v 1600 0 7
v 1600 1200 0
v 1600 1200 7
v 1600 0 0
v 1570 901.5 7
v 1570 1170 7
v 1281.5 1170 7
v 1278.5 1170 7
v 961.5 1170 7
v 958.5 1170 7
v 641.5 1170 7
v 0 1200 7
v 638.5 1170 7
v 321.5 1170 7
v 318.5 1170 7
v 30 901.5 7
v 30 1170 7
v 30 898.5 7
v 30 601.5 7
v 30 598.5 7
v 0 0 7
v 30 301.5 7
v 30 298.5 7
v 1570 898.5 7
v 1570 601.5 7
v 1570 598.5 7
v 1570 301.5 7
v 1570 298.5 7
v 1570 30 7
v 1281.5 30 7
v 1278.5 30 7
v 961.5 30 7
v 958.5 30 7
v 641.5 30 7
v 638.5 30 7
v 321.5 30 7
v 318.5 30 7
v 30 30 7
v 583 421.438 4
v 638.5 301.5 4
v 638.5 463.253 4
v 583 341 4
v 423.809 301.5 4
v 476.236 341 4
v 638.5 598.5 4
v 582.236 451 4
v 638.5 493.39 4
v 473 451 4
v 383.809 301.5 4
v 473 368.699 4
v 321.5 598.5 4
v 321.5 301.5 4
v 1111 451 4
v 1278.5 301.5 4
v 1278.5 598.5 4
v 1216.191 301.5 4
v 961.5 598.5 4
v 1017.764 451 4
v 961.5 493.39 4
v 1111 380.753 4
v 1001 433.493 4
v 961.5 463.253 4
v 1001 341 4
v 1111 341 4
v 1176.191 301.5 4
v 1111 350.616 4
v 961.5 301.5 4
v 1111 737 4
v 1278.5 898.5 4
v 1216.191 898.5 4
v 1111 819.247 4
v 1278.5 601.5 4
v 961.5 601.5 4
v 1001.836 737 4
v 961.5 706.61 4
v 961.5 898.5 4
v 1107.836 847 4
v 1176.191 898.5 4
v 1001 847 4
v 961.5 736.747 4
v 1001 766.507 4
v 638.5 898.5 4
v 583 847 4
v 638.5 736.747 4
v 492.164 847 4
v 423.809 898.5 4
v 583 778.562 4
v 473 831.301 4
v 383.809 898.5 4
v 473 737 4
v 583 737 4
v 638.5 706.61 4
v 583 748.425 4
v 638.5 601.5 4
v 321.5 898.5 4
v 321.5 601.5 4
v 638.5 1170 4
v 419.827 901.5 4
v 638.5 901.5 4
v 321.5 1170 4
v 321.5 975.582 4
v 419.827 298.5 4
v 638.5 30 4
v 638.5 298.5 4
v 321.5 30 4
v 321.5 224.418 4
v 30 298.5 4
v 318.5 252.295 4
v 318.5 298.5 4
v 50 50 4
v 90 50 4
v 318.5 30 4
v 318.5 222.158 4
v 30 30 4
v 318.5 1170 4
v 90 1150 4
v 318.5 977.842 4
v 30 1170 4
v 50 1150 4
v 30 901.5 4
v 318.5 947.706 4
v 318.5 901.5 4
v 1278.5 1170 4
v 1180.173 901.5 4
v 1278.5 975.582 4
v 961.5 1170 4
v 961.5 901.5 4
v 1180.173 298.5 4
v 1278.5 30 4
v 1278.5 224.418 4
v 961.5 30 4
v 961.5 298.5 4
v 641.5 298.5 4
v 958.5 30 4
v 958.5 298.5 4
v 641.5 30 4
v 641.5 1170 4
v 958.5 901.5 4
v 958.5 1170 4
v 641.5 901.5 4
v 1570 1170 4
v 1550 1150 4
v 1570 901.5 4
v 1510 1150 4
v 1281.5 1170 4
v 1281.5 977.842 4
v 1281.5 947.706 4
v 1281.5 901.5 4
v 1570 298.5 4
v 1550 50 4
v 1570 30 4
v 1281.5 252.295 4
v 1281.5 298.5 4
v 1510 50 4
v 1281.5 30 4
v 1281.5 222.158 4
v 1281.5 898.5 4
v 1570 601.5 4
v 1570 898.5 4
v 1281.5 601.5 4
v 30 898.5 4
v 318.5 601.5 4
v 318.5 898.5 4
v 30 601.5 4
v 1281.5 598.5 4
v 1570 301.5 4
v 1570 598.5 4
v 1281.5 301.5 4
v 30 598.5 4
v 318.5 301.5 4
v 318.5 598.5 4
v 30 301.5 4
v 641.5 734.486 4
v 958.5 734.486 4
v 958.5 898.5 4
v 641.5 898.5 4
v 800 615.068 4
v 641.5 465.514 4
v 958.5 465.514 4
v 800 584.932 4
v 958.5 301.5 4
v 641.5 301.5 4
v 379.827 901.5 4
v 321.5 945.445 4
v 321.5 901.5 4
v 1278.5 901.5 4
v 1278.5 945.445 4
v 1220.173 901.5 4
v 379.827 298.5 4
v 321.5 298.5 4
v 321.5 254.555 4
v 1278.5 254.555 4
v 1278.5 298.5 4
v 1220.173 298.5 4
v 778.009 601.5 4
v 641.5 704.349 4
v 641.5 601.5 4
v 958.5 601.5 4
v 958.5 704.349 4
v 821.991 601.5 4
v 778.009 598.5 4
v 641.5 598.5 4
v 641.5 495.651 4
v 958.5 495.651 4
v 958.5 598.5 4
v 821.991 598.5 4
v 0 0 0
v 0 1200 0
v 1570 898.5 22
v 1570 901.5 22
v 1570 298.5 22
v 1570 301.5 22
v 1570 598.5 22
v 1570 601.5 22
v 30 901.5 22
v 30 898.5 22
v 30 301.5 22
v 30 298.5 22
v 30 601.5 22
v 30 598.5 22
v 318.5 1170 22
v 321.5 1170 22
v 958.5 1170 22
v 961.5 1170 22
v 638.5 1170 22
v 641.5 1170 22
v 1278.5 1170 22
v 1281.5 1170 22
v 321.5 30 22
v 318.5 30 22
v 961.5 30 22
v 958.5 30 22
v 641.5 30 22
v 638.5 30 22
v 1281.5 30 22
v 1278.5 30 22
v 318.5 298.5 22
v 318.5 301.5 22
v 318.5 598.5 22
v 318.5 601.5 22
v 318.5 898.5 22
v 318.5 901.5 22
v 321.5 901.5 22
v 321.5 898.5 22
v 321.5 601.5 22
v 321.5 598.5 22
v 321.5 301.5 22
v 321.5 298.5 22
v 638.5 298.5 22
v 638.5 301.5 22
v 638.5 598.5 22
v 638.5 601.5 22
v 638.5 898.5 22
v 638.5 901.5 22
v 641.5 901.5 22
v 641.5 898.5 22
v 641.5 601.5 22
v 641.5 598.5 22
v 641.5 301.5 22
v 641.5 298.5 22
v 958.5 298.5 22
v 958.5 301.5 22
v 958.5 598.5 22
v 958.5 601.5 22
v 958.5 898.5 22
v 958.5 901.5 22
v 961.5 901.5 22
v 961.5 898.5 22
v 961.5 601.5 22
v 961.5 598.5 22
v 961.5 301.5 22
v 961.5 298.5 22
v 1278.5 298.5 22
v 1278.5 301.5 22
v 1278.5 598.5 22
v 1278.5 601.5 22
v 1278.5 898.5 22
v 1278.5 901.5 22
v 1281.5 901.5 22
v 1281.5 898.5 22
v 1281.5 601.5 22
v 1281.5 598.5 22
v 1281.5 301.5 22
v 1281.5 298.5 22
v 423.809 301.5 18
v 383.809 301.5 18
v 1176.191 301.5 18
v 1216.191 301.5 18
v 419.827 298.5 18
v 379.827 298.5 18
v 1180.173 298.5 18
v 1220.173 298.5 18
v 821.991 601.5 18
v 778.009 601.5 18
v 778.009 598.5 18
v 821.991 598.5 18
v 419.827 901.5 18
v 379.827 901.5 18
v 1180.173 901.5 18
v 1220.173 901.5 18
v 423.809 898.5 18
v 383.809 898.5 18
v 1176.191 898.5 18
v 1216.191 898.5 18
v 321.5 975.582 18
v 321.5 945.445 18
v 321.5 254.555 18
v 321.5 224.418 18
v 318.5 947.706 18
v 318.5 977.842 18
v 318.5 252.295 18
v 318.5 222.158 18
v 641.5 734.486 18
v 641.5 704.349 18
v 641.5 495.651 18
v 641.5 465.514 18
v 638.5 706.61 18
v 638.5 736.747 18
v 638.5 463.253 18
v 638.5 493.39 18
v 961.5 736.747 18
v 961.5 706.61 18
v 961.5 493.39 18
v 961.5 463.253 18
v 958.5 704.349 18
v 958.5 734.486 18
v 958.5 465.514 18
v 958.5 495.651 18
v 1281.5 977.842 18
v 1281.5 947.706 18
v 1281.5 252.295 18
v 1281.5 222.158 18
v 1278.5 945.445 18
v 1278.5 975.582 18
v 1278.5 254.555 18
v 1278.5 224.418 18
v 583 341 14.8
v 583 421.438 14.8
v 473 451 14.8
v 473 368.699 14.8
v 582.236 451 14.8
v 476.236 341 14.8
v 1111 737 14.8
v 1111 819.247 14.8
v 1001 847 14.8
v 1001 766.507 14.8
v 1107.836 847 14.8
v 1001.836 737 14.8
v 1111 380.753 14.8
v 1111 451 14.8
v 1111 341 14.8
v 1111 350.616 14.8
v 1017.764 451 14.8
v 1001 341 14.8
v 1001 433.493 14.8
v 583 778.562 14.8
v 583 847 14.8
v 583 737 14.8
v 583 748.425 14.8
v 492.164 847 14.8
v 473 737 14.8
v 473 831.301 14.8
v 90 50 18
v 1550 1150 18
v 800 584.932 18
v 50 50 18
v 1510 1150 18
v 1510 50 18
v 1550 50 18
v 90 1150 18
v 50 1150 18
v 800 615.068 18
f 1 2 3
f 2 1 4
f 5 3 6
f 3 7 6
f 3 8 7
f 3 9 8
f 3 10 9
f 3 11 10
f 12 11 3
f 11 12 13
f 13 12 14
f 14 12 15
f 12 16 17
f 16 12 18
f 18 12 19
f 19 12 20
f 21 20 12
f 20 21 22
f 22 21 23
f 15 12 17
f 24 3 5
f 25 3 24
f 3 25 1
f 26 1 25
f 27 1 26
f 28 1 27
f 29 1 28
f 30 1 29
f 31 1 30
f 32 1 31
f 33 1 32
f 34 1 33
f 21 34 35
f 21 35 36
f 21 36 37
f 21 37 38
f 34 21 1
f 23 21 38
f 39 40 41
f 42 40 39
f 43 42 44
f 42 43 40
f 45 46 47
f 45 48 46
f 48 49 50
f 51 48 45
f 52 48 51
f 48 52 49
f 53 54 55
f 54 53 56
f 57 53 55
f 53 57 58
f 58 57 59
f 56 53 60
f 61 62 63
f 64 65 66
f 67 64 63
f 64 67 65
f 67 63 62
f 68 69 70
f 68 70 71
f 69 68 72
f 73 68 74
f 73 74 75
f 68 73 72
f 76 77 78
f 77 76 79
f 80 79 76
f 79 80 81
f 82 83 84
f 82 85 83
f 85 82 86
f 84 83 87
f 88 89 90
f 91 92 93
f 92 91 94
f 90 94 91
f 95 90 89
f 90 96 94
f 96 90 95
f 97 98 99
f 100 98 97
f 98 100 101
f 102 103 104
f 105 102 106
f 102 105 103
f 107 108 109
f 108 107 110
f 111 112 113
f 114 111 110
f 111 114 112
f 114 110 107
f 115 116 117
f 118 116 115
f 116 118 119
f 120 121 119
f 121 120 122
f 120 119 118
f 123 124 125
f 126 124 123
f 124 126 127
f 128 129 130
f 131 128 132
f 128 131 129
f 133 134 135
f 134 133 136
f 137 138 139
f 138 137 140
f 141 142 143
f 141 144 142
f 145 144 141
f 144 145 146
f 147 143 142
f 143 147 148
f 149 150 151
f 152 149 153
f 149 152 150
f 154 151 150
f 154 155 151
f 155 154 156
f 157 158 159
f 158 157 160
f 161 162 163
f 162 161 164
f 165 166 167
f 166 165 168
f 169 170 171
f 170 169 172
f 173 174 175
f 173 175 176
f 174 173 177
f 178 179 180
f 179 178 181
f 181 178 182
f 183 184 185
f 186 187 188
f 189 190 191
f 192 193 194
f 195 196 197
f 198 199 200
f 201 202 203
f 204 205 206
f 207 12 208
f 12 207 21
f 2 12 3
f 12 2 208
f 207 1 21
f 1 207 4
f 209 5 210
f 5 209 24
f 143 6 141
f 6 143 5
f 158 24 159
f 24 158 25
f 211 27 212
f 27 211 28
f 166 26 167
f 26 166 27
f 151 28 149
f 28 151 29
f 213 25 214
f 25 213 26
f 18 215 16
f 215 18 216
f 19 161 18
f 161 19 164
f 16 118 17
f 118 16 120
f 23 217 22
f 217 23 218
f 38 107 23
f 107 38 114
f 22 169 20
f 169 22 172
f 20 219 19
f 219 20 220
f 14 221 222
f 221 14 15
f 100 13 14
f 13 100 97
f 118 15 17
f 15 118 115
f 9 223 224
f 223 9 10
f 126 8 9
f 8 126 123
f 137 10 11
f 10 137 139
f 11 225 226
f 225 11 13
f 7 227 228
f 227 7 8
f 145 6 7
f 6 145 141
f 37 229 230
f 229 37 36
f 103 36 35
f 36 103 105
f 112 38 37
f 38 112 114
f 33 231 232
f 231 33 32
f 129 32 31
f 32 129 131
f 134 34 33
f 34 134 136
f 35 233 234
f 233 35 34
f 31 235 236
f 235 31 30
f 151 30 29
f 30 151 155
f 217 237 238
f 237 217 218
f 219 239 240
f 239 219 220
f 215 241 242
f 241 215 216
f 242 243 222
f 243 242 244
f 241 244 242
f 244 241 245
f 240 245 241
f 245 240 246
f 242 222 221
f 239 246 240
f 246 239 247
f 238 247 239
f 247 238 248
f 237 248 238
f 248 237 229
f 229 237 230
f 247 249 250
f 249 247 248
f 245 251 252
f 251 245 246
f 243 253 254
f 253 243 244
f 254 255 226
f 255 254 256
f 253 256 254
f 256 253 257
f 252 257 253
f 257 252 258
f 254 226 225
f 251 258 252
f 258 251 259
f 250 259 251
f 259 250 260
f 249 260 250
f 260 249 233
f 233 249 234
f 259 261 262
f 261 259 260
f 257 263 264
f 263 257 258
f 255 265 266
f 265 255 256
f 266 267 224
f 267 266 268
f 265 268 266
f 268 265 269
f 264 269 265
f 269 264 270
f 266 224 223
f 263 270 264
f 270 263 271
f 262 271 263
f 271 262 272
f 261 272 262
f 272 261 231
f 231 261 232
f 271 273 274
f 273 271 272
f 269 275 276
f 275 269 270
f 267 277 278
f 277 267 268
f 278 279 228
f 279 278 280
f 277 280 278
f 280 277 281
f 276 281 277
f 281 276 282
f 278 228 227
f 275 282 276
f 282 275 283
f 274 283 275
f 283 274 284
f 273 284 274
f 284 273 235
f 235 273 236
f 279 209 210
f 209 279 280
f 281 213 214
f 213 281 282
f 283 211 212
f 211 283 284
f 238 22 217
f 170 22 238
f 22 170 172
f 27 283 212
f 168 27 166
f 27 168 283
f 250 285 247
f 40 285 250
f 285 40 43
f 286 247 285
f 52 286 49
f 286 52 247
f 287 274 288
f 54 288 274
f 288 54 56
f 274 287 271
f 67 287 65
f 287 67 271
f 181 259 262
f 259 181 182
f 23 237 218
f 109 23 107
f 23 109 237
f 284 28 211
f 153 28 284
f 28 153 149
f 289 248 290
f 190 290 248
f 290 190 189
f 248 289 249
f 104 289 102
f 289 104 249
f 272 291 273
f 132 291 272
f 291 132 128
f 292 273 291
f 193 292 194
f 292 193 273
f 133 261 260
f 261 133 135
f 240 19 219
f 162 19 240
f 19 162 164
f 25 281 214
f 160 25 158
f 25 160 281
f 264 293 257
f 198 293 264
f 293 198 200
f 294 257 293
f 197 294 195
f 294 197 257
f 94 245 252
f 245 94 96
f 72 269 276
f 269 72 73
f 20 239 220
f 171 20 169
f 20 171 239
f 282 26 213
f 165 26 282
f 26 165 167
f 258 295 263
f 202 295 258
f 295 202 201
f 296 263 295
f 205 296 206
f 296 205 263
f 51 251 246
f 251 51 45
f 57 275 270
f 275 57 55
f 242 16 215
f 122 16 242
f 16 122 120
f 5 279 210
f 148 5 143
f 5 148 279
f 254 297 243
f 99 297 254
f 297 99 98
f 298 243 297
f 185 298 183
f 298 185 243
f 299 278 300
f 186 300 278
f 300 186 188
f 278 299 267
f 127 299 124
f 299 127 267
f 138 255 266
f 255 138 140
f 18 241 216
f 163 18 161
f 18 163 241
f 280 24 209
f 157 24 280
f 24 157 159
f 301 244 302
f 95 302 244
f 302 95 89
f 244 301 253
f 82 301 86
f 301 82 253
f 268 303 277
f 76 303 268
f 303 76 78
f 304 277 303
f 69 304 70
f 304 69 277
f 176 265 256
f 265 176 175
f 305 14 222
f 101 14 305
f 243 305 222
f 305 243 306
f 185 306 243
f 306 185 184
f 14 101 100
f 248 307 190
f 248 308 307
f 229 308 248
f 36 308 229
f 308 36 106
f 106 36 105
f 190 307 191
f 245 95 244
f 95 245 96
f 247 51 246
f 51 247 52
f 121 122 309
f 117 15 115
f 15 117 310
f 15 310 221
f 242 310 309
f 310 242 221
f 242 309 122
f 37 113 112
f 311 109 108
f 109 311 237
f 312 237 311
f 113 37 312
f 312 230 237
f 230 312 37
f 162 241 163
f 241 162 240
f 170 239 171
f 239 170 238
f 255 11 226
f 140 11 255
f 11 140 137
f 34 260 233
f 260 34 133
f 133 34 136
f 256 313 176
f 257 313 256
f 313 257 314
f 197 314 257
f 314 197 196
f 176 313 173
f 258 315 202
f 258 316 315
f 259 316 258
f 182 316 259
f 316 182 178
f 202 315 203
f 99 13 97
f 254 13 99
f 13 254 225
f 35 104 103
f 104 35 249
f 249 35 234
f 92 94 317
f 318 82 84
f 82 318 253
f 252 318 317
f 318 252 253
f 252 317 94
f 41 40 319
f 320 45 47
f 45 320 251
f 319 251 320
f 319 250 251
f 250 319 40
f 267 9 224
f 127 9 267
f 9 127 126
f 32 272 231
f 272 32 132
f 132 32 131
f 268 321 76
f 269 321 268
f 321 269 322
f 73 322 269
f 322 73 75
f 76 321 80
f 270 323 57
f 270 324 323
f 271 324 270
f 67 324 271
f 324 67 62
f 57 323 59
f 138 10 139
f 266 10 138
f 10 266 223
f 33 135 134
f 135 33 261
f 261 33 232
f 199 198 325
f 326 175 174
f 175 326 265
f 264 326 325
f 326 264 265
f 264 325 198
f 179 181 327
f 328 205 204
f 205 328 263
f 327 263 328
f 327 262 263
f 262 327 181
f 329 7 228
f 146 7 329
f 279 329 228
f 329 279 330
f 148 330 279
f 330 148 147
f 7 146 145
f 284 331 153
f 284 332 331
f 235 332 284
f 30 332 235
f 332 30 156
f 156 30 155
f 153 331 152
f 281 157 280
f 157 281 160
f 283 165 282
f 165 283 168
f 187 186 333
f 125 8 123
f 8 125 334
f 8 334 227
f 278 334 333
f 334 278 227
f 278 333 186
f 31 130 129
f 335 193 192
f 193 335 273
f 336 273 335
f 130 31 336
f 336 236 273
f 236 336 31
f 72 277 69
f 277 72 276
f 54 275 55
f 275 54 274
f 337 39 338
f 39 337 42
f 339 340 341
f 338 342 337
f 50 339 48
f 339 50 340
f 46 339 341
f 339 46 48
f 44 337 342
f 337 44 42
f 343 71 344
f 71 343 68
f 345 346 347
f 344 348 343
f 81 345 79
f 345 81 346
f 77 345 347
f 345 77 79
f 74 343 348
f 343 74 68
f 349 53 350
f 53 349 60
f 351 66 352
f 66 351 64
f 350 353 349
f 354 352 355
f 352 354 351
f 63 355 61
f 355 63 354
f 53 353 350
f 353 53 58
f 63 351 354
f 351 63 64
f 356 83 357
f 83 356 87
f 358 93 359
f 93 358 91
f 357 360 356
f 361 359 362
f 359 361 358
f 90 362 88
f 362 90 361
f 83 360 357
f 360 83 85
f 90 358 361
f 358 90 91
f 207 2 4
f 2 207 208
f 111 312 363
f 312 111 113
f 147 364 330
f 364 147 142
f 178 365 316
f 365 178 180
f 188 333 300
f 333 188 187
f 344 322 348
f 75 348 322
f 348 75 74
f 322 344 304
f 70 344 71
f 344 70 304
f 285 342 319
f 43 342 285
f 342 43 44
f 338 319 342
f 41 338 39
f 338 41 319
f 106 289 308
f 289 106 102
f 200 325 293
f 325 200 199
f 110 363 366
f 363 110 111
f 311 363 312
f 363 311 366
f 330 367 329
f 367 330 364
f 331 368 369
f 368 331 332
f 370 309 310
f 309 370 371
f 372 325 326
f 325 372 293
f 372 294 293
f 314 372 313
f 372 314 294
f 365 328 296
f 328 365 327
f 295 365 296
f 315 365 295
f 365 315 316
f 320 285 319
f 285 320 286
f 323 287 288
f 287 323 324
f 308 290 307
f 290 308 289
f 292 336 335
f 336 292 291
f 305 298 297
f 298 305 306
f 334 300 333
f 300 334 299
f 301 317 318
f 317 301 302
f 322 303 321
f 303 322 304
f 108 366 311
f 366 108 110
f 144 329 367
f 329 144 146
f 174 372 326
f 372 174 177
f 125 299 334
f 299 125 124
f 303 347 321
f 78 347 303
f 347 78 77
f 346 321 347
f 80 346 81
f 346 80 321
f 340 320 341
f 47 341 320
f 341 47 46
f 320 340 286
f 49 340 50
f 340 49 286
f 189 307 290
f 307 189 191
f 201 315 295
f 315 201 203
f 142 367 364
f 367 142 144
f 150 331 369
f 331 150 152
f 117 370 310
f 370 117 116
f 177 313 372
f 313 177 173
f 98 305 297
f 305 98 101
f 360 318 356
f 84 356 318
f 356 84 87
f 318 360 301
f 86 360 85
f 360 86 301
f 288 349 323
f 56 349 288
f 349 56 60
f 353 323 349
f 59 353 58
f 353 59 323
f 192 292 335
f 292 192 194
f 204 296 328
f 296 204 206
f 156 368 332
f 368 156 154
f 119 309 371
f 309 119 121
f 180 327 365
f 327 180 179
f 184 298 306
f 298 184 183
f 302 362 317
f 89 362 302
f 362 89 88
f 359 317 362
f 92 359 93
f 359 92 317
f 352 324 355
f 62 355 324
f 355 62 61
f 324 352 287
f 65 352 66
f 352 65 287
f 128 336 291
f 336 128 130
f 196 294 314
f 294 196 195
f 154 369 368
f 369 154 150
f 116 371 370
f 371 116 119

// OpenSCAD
// 电池包底板独立建模 + 拓扑优化后结构重建
// 单位: mm

$fn = 64;

// ---------- 全局参数 ----------
L = 1600;          // 长
W = 1200;          // 宽
T = 4;             // 初始底板厚度
BORDER = 30;       // 边框保留带
RIB_H = 18;        // 加强筋高度
RIB_T = 3;         // 加强筋厚度
MOUNT_D = 16;      // 安装孔孔径

module raw_baseplate(){
  difference(){
    cube([L, W, T], center = false);

    // 安装孔（示例：四角 + 中部）
    for (p = [
      [80,80], [L-80,80], [80,W-80], [L-80,W-80],
      [L/2,120], [L/2,W-120], [120,W/2], [L-120,W/2]
    ]) {
      translate([p[0], p[1], -1]) cylinder(h = T+2, d = MOUNT_D);
    }
  }
}

// 以“拓扑优化结果”重建：
// 1) 边界连续承载环
// 2) 沿主应力路径的 X 向/十字向筋
// 3) 局部载荷区保留实体岛
module optimized_baseplate(){
  union(){
    // 薄板底层
    cube([L, W, T], center = false);

    // 边框承载带
    difference(){
      translate([0,0,T]) cube([L, W, RIB_T], center = false);
      translate([BORDER, BORDER, T-0.5]) cube([L-2*BORDER, W-2*BORDER, RIB_T+1], center = false);
    }

    // X 向主筋（工况：纵向冲击/弯曲）
    linear_extrude(height = RIB_H)
      polygon(points = [
        [BORDER+20, BORDER+20],
        [BORDER+60, BORDER+20],
        [L-BORDER-20, W-BORDER-20],
        [L-BORDER-60, W-BORDER-20]
      ]);

    linear_extrude(height = RIB_H)
      polygon(points = [
        [L-BORDER-20, BORDER+20],
        [L-BORDER-60, BORDER+20],
        [BORDER+20, W-BORDER-20],
        [BORDER+60, W-BORDER-20]
      ]);

    // 横向筋（工况：托底/石击引起局部弯曲）
    for (y = [W*0.25, W*0.5, W*0.75]){
      translate([BORDER, y-RIB_T/2, T]) cube([L-2*BORDER, RIB_T, RIB_H], center = false);
    }

    // 纵向筋（工况：电池模组质量引起跨距挠度）
    for (x = [L*0.2, L*0.4, L*0.6, L*0.8]){
      translate([x-RIB_T/2, BORDER, T]) cube([RIB_T, W-2*BORDER, RIB_H], center = false);
    }

    // 局部载荷实体岛（千斤顶/吊装/碰撞热点）
    for (p = [[L*0.33, W*0.33], [L*0.66, W*0.66], [L*0.66, W*0.33], [L*0.33, W*0.66]]) {
      translate([p[0]-55, p[1]-55, T]) cube([110, 110, RIB_H*0.6], center = false);
    }
  }

  // 重新打孔
  difference(){
    children();
    for (p = [
      [80,80], [L-80,80], [80,W-80], [L-80,W-80],
      [L/2,120], [L/2,W-120], [120,W/2], [L-120,W/2]
    ]) {
      translate([p[0], p[1], -1]) cylinder(h = T+RIB_H+5, d = MOUNT_D);
    }
  }
}

// 切换显示：
// raw_baseplate();
optimized_baseplate();
